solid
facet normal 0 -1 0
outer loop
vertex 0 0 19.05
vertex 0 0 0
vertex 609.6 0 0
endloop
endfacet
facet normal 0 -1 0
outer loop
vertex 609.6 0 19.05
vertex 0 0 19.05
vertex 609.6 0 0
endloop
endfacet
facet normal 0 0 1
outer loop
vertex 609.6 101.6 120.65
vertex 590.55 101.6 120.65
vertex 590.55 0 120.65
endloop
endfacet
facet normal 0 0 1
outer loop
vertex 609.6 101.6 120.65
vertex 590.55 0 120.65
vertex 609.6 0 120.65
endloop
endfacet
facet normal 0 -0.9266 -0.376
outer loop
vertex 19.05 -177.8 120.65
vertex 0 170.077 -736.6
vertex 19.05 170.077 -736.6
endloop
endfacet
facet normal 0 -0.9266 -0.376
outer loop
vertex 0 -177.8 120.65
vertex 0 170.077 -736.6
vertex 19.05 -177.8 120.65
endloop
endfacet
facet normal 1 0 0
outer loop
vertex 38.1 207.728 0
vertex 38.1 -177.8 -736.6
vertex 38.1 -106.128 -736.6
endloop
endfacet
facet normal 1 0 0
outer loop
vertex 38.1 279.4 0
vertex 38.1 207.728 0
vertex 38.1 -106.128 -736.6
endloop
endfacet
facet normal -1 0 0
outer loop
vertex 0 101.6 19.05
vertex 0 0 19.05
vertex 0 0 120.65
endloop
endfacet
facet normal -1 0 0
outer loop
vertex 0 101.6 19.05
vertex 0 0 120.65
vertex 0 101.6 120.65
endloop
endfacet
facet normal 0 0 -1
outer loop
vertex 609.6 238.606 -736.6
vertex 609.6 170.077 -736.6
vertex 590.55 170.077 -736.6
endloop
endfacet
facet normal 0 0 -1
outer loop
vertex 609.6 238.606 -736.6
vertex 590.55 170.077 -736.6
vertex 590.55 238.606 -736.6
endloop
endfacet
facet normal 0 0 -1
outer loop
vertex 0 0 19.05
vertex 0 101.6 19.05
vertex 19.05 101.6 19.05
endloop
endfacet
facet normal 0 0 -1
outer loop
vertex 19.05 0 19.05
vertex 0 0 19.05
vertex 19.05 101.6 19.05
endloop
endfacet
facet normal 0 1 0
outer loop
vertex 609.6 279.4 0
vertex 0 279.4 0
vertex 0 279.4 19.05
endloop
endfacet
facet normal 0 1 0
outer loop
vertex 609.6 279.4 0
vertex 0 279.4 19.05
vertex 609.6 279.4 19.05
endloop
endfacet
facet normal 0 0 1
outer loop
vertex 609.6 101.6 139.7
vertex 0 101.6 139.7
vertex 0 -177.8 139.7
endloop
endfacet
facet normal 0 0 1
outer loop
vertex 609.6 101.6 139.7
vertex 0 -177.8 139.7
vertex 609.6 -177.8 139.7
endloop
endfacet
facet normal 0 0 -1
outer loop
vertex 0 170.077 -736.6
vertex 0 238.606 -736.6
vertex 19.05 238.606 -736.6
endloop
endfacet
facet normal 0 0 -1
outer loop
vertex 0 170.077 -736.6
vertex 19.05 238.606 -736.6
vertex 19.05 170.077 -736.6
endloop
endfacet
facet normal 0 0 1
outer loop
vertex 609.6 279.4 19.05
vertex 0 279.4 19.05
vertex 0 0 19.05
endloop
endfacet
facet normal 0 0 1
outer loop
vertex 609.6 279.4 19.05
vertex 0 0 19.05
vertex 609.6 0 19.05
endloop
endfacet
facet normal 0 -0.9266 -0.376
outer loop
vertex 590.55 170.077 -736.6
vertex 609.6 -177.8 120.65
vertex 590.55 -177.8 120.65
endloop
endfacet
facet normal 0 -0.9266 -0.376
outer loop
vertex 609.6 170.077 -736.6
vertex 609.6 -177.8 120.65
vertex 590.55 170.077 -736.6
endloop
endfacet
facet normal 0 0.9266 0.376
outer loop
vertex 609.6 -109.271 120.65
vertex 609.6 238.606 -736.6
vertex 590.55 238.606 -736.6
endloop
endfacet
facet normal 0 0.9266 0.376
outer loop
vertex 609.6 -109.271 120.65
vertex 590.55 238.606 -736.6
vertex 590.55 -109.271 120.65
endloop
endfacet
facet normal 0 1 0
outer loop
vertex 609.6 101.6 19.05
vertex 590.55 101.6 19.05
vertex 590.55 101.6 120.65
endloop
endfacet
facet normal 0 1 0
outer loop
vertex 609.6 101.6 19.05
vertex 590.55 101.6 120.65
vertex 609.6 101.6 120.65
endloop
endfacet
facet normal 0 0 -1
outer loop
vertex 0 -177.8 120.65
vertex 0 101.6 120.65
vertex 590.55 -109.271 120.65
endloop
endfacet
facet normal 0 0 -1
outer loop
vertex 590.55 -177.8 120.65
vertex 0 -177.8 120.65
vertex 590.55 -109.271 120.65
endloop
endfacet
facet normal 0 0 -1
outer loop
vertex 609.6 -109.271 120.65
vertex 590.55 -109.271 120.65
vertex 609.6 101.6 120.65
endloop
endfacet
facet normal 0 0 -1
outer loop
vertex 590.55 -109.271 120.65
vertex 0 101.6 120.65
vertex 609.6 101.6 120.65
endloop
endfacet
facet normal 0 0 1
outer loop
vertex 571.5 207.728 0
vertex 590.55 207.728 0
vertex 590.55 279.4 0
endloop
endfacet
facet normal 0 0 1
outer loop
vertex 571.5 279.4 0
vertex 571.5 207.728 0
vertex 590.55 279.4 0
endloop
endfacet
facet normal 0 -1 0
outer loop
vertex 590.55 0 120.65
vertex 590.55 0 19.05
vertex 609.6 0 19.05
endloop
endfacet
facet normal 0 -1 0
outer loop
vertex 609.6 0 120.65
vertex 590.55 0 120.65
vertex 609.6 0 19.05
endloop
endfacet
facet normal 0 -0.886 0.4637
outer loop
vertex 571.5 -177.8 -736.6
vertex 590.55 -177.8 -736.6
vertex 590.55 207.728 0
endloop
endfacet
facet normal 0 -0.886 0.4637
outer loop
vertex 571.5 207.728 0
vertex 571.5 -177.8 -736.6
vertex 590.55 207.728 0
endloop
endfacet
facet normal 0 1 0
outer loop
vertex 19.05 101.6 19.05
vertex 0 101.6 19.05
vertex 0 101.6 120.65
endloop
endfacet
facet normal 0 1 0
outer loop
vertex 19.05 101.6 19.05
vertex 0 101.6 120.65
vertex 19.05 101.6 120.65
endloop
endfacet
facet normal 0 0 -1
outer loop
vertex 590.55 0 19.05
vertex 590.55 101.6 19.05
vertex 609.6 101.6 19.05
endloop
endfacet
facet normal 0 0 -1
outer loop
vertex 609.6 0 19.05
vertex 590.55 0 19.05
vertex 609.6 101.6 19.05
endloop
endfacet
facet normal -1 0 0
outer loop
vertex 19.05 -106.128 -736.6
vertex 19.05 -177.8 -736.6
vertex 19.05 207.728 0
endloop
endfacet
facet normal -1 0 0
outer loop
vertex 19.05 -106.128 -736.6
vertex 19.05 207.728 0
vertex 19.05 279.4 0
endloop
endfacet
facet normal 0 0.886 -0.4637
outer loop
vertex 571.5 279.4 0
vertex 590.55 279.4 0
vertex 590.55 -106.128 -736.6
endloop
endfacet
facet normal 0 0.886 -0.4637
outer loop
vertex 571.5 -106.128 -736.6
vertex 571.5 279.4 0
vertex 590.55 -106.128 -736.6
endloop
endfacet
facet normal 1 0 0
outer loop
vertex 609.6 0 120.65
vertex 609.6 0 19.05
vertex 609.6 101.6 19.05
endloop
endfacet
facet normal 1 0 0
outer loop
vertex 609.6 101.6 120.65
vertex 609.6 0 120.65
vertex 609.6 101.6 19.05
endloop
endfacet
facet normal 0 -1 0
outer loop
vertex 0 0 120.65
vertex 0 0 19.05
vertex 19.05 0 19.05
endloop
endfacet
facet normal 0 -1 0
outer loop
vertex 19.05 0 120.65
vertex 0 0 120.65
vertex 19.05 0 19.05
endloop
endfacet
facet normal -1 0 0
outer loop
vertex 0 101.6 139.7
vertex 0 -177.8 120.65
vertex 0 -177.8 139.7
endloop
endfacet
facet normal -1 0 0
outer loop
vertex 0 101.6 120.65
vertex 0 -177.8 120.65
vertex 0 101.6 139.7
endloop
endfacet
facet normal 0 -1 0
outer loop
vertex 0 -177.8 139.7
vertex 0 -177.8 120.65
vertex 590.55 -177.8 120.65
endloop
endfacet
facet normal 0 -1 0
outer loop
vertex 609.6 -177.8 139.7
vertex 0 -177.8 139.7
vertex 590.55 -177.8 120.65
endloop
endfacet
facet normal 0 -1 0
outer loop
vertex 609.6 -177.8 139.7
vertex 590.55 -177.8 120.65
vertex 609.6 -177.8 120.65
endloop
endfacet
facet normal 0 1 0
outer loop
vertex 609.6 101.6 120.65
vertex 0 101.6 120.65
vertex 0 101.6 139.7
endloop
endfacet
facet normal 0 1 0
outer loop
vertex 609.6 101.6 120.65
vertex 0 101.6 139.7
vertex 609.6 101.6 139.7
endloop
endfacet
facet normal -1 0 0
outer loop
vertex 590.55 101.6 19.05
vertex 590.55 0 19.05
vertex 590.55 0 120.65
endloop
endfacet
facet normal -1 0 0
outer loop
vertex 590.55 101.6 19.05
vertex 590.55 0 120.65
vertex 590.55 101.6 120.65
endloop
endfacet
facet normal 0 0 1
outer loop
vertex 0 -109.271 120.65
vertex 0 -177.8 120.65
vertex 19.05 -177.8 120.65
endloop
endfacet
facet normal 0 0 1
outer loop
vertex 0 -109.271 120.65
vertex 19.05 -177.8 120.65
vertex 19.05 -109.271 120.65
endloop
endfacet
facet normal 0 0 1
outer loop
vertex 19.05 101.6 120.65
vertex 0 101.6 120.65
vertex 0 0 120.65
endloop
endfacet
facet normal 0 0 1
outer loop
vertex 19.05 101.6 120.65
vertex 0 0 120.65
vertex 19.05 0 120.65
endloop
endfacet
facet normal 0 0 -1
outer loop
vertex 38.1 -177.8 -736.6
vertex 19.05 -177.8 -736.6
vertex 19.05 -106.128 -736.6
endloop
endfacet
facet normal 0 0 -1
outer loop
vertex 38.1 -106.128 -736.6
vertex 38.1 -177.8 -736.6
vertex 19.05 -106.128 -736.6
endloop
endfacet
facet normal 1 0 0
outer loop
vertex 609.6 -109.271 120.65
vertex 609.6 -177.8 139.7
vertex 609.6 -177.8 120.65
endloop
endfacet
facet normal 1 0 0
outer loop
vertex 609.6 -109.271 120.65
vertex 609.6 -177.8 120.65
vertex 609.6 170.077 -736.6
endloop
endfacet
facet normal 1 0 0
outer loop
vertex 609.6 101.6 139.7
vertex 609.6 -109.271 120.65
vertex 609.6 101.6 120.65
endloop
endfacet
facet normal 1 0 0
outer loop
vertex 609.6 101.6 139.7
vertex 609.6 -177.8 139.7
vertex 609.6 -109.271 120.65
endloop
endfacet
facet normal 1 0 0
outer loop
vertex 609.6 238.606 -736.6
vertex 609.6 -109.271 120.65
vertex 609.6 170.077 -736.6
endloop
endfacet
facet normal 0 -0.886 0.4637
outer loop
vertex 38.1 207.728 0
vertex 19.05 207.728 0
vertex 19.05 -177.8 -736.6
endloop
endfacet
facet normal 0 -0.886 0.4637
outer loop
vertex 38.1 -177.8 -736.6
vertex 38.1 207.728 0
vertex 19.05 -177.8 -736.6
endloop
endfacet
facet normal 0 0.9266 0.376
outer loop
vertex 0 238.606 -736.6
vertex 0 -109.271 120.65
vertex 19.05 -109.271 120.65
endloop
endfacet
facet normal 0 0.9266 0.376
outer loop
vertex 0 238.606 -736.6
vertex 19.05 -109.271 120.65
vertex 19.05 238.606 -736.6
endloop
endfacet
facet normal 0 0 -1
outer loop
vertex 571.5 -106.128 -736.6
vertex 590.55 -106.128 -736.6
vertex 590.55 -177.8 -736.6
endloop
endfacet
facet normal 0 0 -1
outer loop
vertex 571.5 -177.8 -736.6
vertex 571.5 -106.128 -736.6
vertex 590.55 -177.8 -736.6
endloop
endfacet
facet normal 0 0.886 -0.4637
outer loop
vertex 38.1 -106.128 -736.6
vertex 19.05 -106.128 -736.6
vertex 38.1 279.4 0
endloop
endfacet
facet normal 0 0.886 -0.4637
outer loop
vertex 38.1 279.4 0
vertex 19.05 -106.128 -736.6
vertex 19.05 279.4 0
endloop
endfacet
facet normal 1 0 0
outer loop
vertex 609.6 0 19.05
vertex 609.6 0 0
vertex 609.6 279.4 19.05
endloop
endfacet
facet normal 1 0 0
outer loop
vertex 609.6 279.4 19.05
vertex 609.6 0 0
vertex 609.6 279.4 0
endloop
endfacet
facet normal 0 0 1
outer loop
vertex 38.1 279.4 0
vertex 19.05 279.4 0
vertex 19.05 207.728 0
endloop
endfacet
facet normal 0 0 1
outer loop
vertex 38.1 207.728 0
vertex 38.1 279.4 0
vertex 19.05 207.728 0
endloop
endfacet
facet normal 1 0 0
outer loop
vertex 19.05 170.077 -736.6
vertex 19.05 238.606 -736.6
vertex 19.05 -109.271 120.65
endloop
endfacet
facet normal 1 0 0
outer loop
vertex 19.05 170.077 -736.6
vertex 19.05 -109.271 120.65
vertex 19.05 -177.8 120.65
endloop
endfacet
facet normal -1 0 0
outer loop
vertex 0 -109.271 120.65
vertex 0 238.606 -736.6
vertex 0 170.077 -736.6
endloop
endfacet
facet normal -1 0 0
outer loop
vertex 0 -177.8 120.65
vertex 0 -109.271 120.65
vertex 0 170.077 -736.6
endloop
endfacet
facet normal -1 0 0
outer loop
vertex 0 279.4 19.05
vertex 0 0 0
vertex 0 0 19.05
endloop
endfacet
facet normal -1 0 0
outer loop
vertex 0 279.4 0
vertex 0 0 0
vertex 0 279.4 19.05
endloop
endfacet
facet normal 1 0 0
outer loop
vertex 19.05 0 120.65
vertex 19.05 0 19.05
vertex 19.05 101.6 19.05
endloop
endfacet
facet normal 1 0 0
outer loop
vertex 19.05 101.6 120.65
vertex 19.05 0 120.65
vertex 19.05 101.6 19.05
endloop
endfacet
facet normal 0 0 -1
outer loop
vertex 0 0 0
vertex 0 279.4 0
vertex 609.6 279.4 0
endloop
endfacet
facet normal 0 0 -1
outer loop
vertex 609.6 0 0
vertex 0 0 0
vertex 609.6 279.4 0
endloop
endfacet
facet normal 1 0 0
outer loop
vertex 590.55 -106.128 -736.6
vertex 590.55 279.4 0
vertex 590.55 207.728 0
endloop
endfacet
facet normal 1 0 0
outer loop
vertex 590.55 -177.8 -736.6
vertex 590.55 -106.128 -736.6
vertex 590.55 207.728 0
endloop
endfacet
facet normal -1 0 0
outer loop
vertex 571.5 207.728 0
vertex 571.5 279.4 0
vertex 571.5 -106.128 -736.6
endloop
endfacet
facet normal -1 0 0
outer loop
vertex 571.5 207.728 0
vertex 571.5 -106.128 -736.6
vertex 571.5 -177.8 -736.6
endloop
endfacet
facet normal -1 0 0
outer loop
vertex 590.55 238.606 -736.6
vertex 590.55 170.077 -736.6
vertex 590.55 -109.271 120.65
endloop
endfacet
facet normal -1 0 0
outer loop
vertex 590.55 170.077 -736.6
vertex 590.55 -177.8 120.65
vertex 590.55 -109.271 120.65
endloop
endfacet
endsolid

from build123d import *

# Parameters (mm, degrees)
F0_W      = 609.6
F0_H      = 279.4
F1_DEPTH  = 19.05
F3_W      = 609.6
F3_H      = 279.4
F4_DEPTH  = 19.05
F6_DEPTH  = 19.05
F8_DEPTH  = 19.05
F10_DEPTH = 19.05
F12_DEPTH = 19.05
F13_W     = 19.05
F13_H     = 101.6
F14_DEPTH = 101.6


with BuildPart() as f1:
    # F0 (on Top) → F1 (new body)
    with BuildSketch(Plane.XY):
        with Locations((304.8, 139.7)):
            Rectangle(F0_W, F0_H)
    extrude(amount=F1_DEPTH)


with BuildPart() as f4:
    # F3 (on offset) → F4 (new body)
    with BuildSketch(Plane.XY.offset(120.65)):
        with Locations((304.8, -38.1)):
            Rectangle(F3_W, F3_H)
    extrude(amount=F4_DEPTH)

    # F7 (on face) → F8 (join)
    with BuildSketch(Plane.YZ.offset(609.6)):
        Polygon((170.076899, -736.6), (238.606264, -736.6), (-109.270636, 120.65), (-177.8, 120.65), align=None)
    extrude(amount=-F8_DEPTH)


with BuildPart() as f6:
    # F5 (on face) → F6 (new body)
    with BuildSketch(Plane(origin=(0, 0, 0), x_dir=(0, -1, 0), z_dir=(-1, 0, 0))):
        Polygon((-170.076899, -736.6), (177.8, 120.65), (109.270636, 120.65), (-238.606264, -736.6), align=None)
    extrude(amount=-F6_DEPTH)


with BuildPart() as f10:
    # F9 (on face) → F10 (new body)
    with BuildSketch(Plane(origin=(590.55, 0, 0), x_dir=(0, -1, 0), z_dir=(-1, 0, 0))):
        Polygon((177.8, -736.6), (-207.728328, 0), (-279.4, 0), (106.128328, -736.6), align=None)
    extrude(amount=F10_DEPTH)


with BuildPart() as f12:
    # F11 (on face) → F12 (new body)
    with BuildSketch(Plane.YZ.offset(19.05)):
        Polygon((207.728328, 0), (-177.8, -736.6), (-106.128328, -736.6), (279.4, 0), align=None)
    extrude(amount=F12_DEPTH)


with BuildPart() as f14:
    # F13 (on face) → F14 (new body)
    with BuildSketch(Plane.XY.offset(19.05)):
        with Locations((9.525, 50.8)):
            Rectangle(F13_W, F13_H)
        with Locations((600.075, 50.8)):
            Rectangle(F13_W, F13_H)
    extrude(amount=F14_DEPTH)


solid = Compound([f1.part, f4.part, f6.part, f10.part, f12.part, f14.part])
